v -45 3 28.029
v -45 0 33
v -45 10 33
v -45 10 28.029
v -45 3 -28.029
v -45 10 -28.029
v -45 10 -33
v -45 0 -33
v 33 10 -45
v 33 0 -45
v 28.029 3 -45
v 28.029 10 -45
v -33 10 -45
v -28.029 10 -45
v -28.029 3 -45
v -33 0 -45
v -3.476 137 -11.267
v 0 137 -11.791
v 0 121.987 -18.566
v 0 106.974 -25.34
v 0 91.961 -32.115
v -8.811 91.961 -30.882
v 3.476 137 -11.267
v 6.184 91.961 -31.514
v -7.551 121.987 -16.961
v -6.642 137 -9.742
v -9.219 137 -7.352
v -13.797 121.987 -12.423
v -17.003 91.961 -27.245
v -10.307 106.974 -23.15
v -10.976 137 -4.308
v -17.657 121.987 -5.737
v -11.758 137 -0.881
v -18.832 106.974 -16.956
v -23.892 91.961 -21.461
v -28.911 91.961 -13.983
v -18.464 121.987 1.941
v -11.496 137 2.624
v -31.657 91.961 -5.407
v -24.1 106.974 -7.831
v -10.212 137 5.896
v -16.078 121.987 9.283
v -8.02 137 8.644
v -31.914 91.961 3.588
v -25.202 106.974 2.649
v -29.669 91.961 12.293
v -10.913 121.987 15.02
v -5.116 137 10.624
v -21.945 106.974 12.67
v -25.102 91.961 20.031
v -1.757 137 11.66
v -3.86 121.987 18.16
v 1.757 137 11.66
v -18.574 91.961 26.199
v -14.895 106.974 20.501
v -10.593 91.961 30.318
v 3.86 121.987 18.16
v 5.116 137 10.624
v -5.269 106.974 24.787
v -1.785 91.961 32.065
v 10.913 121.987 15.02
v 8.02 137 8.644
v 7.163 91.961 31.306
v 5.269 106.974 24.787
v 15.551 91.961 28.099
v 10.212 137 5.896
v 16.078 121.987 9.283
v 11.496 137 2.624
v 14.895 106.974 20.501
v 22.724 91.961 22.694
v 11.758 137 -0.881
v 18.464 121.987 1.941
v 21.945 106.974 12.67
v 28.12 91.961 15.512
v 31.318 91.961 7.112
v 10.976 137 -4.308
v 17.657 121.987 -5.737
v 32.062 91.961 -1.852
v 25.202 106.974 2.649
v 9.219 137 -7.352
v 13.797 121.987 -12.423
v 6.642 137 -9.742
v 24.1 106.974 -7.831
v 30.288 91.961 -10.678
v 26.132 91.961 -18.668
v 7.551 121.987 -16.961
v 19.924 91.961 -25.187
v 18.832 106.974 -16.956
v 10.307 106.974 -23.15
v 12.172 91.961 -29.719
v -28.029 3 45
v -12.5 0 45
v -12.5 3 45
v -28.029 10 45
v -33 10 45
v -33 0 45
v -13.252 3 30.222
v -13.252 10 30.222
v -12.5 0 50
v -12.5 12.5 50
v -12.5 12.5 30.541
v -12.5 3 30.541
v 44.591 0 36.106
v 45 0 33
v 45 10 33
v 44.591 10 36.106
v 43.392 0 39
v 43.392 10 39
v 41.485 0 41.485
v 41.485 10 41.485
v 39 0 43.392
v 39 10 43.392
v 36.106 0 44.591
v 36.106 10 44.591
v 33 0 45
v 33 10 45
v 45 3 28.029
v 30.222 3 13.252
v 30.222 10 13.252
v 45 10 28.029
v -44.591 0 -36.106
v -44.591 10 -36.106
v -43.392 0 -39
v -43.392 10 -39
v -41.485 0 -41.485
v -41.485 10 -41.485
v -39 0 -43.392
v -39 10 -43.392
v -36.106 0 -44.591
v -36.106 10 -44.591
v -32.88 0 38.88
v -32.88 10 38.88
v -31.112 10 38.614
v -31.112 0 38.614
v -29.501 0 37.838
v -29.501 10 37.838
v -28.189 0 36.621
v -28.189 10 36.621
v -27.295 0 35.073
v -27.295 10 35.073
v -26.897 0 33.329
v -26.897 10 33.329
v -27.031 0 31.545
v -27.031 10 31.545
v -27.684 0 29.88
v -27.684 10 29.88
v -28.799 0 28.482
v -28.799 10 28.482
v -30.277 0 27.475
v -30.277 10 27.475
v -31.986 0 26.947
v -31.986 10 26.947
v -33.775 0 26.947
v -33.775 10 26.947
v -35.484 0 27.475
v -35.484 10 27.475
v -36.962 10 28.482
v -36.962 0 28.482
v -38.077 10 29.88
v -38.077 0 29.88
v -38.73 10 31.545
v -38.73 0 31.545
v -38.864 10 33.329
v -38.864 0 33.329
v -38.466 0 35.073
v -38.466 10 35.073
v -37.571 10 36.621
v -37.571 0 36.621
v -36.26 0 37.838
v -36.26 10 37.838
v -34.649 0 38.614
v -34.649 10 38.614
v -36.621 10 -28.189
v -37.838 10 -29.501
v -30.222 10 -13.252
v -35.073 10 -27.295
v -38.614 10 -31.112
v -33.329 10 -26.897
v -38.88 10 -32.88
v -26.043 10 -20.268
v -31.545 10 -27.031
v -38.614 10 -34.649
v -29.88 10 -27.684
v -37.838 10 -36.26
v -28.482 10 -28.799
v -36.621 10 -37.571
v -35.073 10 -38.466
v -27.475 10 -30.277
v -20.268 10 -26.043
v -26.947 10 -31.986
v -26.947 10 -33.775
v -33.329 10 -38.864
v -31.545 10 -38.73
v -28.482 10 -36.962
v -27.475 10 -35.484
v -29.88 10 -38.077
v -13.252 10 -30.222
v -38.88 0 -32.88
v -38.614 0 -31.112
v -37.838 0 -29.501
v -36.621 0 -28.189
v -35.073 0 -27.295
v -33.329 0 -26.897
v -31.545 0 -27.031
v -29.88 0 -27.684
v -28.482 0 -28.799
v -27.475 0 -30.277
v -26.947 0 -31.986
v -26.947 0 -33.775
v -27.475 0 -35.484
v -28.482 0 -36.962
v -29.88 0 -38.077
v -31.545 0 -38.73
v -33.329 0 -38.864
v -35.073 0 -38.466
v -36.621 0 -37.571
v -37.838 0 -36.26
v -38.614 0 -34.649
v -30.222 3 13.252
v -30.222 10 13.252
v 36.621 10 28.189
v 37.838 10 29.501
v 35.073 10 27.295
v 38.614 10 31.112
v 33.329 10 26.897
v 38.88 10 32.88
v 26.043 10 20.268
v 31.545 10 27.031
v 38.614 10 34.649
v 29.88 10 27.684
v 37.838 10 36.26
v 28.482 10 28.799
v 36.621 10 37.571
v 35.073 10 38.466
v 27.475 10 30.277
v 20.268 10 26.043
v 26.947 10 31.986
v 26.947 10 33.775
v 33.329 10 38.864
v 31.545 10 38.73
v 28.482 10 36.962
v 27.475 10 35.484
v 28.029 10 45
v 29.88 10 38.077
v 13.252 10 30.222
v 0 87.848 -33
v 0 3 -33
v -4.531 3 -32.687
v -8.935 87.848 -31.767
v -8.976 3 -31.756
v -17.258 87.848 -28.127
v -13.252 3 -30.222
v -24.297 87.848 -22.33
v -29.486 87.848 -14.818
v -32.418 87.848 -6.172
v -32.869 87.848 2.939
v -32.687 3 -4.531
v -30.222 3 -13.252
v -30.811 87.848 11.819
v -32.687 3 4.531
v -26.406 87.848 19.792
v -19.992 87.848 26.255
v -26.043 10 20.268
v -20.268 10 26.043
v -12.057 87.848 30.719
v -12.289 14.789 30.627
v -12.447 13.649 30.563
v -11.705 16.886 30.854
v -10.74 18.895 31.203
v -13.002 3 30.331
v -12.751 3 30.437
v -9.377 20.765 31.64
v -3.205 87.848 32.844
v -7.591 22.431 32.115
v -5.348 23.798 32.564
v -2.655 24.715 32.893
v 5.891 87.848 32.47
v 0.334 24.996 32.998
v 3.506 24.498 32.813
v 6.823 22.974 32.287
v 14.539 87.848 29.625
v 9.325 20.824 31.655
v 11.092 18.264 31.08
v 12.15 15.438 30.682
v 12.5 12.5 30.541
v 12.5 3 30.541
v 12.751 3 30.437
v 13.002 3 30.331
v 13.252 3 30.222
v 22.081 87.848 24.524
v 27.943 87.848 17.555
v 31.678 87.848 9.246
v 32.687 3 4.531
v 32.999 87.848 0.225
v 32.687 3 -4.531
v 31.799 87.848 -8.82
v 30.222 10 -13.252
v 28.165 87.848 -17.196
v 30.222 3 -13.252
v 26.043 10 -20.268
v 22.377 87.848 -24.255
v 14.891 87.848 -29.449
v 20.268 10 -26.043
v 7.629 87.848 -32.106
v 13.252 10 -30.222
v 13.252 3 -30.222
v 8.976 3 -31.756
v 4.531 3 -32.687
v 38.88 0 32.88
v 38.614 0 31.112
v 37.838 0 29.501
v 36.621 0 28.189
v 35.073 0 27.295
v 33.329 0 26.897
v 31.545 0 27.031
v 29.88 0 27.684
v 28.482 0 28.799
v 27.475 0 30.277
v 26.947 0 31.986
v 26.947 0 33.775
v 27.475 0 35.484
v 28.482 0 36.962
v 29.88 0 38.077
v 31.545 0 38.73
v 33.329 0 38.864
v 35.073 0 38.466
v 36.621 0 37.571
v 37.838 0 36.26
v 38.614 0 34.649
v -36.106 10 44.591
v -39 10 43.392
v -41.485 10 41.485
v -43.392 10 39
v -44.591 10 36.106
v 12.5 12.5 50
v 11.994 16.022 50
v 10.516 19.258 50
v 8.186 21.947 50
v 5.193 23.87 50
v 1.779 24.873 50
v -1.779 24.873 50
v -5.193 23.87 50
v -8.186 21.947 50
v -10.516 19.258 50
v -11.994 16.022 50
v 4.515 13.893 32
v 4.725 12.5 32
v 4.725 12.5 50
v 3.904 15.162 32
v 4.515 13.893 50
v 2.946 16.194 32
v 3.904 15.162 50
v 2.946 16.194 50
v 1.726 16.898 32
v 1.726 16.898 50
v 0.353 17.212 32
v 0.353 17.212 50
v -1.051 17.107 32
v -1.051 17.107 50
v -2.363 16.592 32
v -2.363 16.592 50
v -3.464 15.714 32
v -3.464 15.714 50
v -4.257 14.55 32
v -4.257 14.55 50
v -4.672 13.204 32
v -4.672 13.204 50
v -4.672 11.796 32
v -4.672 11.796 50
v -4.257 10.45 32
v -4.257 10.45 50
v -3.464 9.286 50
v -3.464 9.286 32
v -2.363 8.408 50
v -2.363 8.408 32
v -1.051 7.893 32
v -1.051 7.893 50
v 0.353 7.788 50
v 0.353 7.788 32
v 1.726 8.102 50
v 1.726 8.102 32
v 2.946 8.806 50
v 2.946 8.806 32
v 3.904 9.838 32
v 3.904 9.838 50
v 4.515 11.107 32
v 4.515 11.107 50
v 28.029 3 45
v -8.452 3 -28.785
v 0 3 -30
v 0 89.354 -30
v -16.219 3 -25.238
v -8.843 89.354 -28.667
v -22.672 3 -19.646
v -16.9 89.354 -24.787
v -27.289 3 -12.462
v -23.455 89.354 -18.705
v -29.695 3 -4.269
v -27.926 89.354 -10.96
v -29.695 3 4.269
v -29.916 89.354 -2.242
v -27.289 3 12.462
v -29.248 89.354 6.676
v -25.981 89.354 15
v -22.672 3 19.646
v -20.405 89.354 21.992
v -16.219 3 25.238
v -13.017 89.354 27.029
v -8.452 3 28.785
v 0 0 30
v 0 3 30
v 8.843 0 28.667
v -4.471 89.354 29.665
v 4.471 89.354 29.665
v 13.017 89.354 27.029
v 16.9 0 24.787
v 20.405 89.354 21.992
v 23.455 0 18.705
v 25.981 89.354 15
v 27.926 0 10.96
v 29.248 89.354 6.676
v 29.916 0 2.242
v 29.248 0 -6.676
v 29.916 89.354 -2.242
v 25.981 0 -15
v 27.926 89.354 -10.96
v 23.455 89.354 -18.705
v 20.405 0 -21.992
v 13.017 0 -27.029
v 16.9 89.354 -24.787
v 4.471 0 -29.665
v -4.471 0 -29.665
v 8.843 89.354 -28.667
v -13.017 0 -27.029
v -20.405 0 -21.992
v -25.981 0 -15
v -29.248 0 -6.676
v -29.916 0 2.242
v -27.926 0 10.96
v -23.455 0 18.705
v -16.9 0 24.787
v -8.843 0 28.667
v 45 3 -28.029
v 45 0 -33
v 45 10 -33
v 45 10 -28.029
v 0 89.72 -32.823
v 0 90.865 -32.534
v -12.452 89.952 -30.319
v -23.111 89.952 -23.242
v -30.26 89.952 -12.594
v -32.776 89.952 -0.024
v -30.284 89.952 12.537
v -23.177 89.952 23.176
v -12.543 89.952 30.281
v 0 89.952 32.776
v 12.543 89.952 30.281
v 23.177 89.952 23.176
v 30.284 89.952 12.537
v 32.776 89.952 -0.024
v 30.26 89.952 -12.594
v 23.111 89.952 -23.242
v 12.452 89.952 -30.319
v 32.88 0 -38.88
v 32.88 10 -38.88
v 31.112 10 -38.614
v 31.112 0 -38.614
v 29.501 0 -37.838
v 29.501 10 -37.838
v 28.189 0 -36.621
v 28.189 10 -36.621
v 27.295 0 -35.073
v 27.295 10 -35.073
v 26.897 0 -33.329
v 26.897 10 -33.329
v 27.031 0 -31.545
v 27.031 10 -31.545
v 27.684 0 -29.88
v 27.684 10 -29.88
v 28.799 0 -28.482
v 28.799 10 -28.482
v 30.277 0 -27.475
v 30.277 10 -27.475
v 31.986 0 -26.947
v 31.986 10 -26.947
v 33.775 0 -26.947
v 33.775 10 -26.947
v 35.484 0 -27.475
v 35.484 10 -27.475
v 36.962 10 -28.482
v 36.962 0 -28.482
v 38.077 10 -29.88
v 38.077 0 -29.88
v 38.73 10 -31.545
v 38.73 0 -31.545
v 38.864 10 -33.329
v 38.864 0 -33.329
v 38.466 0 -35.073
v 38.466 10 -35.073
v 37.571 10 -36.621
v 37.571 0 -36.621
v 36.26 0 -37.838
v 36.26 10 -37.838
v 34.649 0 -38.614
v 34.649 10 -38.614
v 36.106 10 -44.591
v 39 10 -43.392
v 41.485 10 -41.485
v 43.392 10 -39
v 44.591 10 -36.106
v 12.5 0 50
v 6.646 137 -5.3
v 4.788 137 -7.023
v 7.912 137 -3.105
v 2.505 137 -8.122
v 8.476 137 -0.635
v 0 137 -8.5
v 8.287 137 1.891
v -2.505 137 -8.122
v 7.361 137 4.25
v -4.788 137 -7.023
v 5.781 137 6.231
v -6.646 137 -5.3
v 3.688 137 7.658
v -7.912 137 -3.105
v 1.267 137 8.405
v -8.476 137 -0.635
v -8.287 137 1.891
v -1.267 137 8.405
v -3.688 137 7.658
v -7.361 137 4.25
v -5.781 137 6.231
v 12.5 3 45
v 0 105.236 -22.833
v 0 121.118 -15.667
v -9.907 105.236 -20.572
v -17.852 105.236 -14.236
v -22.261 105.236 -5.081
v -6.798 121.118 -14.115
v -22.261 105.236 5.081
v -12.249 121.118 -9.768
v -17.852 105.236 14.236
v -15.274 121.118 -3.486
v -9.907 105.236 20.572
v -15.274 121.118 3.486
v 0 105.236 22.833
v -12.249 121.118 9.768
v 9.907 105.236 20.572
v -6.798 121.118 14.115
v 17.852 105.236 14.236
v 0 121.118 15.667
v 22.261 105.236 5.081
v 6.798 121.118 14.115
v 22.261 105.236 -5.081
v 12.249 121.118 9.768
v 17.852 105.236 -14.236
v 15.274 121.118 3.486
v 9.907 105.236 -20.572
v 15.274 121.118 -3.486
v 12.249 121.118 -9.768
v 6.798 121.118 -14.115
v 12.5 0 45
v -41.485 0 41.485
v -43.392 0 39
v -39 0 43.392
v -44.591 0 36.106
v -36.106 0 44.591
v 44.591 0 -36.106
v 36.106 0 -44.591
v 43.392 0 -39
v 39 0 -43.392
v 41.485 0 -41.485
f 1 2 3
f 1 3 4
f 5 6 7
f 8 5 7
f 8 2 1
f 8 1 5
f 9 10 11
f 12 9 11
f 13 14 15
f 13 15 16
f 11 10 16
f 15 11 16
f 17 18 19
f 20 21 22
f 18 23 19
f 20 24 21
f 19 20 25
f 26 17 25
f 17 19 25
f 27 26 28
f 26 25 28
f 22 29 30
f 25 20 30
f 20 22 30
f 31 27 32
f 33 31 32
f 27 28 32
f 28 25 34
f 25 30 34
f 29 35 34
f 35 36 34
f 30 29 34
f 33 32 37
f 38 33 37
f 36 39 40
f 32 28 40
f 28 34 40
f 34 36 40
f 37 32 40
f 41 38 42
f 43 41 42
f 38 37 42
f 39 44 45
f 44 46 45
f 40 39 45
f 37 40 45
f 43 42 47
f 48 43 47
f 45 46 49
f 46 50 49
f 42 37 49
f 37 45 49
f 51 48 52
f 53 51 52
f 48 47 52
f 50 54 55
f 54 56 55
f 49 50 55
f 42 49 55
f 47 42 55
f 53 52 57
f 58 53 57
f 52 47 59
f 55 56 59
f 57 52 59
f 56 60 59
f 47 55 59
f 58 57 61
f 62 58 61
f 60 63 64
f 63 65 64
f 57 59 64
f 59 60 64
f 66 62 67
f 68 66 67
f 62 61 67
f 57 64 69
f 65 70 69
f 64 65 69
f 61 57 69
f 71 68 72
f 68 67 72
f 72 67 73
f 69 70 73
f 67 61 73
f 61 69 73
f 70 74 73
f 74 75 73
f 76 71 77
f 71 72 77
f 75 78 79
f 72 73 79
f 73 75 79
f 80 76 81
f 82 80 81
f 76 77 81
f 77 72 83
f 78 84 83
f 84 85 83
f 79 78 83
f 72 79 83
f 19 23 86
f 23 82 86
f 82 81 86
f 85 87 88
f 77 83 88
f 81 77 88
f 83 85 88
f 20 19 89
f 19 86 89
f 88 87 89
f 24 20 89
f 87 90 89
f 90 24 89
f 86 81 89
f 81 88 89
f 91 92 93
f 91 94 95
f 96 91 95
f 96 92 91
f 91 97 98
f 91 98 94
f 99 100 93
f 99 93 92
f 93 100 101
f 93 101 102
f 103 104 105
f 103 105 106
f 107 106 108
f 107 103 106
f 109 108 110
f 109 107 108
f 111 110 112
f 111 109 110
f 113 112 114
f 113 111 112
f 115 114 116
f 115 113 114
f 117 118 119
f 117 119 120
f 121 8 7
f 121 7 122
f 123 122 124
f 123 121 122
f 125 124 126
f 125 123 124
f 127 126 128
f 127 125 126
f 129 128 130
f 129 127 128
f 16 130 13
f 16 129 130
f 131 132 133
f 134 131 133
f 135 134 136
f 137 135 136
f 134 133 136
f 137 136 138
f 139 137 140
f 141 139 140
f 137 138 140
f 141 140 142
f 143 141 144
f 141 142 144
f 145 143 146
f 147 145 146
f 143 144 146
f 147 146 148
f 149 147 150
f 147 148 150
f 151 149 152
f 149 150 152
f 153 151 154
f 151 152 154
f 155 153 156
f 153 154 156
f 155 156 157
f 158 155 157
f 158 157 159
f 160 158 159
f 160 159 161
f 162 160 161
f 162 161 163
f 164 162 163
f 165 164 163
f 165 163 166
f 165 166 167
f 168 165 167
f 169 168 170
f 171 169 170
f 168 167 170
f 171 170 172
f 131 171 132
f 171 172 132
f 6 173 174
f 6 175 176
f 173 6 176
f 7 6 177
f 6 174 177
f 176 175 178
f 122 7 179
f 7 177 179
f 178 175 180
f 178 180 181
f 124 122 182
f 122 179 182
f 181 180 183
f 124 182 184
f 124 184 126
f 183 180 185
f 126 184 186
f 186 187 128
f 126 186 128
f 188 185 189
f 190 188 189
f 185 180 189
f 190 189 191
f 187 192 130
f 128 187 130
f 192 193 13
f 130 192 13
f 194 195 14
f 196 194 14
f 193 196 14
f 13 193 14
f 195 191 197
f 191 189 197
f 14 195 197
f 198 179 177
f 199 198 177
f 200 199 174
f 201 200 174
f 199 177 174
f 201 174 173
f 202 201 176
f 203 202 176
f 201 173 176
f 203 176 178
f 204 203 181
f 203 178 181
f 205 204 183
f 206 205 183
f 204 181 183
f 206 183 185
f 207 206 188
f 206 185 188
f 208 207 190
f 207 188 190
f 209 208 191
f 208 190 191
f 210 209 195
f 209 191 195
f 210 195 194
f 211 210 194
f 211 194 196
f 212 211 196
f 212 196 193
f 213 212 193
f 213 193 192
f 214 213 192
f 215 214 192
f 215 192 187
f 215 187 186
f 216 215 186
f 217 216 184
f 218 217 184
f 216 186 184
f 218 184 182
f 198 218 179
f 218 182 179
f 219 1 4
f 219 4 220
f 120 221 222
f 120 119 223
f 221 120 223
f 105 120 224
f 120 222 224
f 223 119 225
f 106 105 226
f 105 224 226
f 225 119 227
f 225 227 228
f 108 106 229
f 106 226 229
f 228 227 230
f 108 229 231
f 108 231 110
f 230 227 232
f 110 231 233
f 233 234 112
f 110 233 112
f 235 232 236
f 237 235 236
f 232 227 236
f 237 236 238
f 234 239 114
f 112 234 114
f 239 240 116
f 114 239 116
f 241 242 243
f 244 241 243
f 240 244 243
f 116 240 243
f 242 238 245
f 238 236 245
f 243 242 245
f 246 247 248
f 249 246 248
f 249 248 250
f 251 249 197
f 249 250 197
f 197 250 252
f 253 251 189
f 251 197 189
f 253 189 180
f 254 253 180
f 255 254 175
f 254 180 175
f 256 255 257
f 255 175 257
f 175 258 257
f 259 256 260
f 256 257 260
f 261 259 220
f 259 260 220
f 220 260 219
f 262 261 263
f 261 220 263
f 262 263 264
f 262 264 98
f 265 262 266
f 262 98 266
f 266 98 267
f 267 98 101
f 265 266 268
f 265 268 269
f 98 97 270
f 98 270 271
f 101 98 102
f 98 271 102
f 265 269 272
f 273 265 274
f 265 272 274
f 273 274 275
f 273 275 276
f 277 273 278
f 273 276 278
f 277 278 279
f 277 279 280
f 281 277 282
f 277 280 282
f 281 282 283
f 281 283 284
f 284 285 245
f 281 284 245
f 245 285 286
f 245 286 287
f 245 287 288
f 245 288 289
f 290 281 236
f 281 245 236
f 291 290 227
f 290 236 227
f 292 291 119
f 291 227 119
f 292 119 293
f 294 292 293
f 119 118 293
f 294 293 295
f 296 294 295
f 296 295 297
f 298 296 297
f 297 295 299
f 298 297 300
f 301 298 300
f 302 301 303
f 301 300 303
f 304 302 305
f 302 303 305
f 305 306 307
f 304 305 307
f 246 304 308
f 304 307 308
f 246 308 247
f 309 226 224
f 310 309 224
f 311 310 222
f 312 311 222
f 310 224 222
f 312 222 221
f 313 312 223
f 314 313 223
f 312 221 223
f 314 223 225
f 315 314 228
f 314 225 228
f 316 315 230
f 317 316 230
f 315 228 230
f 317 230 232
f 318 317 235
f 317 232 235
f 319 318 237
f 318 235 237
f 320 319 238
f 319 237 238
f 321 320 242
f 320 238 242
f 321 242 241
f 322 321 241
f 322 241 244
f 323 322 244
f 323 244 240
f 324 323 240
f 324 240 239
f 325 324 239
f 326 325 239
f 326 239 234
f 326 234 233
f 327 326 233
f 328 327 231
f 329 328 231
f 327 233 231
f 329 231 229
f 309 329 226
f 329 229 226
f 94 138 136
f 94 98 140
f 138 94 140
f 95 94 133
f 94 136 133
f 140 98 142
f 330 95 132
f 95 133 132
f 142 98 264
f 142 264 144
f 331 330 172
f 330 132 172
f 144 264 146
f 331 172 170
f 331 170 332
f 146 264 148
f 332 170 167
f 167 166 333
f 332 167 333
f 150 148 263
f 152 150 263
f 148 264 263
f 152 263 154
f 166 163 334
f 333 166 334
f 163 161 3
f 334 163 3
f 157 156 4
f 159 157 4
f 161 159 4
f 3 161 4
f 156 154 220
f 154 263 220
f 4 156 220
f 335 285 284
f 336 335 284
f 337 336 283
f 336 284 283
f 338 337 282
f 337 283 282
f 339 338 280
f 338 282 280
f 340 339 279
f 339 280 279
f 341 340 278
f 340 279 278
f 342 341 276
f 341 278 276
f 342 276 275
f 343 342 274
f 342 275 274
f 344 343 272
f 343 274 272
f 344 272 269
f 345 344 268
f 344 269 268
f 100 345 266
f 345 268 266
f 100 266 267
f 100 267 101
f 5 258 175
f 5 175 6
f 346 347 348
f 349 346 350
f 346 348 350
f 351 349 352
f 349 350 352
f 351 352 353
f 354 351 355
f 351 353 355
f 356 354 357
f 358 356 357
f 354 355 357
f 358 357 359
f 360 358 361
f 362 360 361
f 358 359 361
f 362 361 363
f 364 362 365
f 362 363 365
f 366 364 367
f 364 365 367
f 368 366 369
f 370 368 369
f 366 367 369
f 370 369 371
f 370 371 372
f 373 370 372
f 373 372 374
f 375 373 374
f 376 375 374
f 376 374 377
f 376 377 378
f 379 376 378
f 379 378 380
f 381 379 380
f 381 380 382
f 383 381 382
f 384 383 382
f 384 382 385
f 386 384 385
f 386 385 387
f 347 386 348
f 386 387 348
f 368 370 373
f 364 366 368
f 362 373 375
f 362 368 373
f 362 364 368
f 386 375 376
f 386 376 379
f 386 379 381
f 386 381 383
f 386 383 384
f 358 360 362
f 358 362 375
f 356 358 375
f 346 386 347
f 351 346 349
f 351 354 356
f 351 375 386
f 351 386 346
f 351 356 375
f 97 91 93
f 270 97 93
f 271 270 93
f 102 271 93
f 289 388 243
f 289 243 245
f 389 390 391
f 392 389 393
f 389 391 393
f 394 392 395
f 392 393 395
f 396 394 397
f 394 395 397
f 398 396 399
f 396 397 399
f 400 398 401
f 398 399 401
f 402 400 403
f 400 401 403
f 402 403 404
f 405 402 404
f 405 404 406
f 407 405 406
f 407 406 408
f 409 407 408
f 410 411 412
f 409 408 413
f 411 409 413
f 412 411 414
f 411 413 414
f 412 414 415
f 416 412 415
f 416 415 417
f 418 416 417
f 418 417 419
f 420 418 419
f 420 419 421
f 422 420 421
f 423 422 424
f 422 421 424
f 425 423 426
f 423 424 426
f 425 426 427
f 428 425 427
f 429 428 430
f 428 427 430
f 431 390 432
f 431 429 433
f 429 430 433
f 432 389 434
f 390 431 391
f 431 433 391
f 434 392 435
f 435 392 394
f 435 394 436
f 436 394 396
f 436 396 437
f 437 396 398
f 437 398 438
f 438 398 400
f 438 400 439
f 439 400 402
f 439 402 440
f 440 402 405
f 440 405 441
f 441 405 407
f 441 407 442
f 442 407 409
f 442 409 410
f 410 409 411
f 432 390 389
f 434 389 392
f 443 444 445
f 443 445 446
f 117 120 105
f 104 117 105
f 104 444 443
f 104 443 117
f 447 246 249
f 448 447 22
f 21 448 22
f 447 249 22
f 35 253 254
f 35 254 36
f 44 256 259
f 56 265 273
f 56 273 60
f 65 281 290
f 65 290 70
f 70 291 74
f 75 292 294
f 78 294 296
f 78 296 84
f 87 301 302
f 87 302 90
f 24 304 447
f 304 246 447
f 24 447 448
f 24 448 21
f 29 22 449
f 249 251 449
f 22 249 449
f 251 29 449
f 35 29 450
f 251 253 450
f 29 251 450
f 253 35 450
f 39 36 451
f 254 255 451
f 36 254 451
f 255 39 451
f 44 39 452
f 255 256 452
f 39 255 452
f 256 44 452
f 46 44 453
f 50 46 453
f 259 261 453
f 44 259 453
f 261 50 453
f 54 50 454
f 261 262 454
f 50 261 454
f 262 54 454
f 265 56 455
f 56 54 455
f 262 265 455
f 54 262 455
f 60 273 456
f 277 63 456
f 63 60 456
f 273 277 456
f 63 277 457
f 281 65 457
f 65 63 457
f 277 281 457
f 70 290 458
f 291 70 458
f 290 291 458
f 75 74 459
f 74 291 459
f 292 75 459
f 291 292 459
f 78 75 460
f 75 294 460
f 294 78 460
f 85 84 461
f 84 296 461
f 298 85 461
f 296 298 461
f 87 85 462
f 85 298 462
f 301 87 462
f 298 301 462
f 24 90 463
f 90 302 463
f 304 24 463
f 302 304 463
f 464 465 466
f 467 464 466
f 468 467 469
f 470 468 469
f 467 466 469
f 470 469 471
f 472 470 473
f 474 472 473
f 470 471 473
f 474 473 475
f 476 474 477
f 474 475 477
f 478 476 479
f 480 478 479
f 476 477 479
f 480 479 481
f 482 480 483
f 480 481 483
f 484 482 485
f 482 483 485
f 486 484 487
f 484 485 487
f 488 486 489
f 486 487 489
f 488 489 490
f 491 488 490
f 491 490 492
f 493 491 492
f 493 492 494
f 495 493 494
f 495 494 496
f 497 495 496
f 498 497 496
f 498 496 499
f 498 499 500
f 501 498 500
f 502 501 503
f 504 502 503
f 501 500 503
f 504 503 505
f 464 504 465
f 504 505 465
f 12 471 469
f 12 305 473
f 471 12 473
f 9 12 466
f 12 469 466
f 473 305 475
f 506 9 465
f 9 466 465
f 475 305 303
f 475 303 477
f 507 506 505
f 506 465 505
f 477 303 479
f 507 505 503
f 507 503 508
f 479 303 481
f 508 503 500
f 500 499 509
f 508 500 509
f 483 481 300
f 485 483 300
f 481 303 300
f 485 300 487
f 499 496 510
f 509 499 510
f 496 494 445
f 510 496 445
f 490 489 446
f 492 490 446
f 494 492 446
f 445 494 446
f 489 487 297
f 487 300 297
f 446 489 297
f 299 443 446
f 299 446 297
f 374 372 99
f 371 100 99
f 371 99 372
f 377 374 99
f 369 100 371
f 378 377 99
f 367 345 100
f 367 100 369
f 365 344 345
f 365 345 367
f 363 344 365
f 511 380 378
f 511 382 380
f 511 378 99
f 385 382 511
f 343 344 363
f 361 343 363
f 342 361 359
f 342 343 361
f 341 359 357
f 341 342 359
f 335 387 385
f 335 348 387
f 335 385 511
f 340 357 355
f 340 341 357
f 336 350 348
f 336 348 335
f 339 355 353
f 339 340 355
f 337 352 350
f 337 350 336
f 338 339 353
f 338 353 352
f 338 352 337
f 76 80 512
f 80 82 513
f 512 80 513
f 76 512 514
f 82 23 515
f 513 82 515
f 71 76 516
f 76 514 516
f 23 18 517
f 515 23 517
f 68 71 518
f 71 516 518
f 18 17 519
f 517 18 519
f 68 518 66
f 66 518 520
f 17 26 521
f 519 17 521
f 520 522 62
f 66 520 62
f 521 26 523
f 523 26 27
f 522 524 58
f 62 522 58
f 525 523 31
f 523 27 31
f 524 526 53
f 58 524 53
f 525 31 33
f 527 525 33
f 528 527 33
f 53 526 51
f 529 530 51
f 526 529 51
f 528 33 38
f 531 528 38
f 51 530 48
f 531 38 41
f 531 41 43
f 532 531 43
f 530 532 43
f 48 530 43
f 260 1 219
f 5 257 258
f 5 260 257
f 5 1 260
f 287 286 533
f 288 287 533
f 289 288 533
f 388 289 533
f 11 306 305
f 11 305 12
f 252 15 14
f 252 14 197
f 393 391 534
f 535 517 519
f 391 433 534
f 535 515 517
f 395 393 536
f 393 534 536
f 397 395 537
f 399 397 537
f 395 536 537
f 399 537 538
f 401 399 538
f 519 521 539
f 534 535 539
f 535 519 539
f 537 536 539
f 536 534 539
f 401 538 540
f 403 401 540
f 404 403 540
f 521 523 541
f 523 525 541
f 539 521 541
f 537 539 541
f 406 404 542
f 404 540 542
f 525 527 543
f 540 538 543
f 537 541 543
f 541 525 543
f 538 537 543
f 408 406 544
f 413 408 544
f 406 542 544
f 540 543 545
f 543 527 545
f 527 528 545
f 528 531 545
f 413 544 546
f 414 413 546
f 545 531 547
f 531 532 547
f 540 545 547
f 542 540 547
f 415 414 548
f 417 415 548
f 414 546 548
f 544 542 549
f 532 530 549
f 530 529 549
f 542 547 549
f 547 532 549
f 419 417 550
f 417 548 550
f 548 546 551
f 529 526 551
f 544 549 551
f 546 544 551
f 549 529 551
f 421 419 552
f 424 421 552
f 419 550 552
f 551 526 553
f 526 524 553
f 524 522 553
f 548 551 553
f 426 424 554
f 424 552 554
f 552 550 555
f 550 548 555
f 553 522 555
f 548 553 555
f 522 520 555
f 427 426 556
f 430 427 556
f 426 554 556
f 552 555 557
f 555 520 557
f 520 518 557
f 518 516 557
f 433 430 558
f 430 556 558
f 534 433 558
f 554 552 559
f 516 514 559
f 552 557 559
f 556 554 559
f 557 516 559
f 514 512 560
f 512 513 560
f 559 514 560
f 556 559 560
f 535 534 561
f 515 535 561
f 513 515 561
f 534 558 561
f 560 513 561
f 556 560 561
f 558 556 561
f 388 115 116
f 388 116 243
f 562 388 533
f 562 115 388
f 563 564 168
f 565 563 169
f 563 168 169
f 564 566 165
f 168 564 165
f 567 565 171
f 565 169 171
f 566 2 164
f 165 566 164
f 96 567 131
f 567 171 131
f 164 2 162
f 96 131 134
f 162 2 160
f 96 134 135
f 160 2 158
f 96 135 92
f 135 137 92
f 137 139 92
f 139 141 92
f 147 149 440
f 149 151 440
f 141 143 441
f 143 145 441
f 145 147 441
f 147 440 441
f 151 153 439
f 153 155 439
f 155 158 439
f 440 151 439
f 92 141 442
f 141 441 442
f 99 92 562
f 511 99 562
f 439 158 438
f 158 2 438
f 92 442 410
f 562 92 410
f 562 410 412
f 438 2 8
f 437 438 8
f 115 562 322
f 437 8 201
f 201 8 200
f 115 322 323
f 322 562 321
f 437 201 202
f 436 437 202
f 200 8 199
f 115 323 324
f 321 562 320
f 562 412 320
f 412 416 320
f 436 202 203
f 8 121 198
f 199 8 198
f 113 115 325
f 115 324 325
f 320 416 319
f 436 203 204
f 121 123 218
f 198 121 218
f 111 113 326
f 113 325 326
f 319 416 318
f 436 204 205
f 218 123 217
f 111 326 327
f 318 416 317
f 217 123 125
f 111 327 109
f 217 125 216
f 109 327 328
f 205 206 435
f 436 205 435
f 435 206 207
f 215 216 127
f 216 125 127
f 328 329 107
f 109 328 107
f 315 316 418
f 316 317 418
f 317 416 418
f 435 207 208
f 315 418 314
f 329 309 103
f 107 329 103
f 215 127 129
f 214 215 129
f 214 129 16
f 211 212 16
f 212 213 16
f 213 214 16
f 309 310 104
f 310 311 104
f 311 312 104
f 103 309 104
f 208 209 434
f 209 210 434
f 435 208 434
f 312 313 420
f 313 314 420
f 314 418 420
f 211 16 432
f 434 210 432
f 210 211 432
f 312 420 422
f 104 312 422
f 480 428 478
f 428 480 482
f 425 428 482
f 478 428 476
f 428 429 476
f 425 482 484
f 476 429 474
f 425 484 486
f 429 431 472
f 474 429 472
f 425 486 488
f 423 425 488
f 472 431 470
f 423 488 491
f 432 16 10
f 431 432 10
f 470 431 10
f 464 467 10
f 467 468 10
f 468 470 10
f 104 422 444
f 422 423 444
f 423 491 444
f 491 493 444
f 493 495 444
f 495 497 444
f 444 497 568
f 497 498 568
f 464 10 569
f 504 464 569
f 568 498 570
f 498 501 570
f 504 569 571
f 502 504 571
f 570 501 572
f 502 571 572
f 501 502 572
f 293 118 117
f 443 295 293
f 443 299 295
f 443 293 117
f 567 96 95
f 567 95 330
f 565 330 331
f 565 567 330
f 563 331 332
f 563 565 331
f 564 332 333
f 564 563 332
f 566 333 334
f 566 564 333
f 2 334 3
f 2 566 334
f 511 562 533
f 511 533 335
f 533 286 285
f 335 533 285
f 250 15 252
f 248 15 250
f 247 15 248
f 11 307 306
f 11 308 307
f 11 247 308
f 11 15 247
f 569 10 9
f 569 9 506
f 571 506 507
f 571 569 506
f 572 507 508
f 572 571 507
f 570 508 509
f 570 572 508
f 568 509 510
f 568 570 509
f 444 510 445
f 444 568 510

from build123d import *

# Parameters (mm, degrees)
BOSS_EXTRUDE1_DEPTH = 3
SKETCH2_R           = 30
CUT_EXTRUDE1_DEPTH  = 3
BOSS_EXTRUDE2_DEPTH = 7
SKETCH5_R           = 6
CUT_EXTRUDE2_DEPTH  = 10
CIRPATTERN1_COUNT   = 4
BOSS_EXTRUDE3_START = -14.459044
BOSS_EXTRUDE3_DEPTH = 19.459044
SKETCH8_R           = 4.725
CUT_EXTRUDE3_DEPTH  = 18
FILLET1_R           = 10


with BuildPart() as part:
    # Sketch1 → Boss-Extrude1 (new body)
    with BuildSketch(Plane(origin=(0, 0, 0), x_dir=(1, 0, 0), z_dir=(0, 1, 0))):
        with BuildLine():
            Line((-33, -45), (33, -45))
            ThreePointArc((33, -45), (41.485281374, -41.485281374), (45, -33))
            Line((45, -33), (45, 33))
            ThreePointArc((45, 33), (41.485281374, 41.485281374), (33, 45))
            Line((33, 45), (-33, 45))
            ThreePointArc((-33, 45), (-41.485281374, 41.485281374), (-45, 33))
            Line((-45, 33), (-45, -33))
            ThreePointArc((-45, -33), (-41.485281374, -41.485281374), (-33, -45))
        make_face()
    extrude(amount=BOSS_EXTRUDE1_DEPTH)

    # Sketch2 → Cut-Extrude1 (cut)
    with BuildSketch(Plane(origin=(0, 3, 0), x_dir=(1, 0, 0), z_dir=(0, 1, 0))):
        with Locations(Location((0, 0, 0), (0, 0, 270))):
            Circle(SKETCH2_R)
    extrude(amount=-CUT_EXTRUDE1_DEPTH, mode=Mode.SUBTRACT)

    # Sketch3 → Revolve1 (revolve)
    with BuildSketch(Plane.XY, mode=Mode.PRIVATE) as revolve1_sk:
        Polygon((30, 3), (30, 89.354466715), (8.5, 137), (11.79129626, 137), (33, 90), (33, 3), align=None)
    revolve(revolve1_sk.sketch.rotate(Axis((0, -84.852813742, 0), (0, 1, 0)), 90), axis=Axis((0, -84.852813742, 0), (0, 1, 0)))

    # Sketch4 → Boss-Extrude2 (add)
    with BuildSketch(Plane(origin=(0, 3, 0), x_dir=(1, 0, 0), z_dir=(0, 1, 0))):
        with BuildLine():
            Line((-13.251783745, -30.222346494), (-28.029437252, -45))
            Line((-28.029437252, -45), (-33, -45))
            ThreePointArc((-33, -45), (-41.485281374, -41.485281374), (-45, -33))
            Line((-45, -33), (-45, -28.029437252))
            Line((-45, -28.029437252), (-30.222346494, -13.251783745))
            ThreePointArc((-30.222346494, -13.251783745), (-23.334523779, -23.334523779), (-13.251783745, -30.222346494))
        make_face()
    boss_extrude2 = extrude(amount=BOSS_EXTRUDE2_DEPTH)

    # Sketch5 → Cut-Extrude2 (cut)
    with BuildSketch(Plane(origin=(0, 10, 0), x_dir=(1, 0, 0), z_dir=(0, 1, 0))):
        with Locations(Location((-32.880465325, -32.880465325, 0), (0, 0, 270))):
            Circle(SKETCH5_R)
    cut_extrude2 = extrude(amount=-CUT_EXTRUDE2_DEPTH, mode=Mode.SUBTRACT)

    # CirPattern1: Boss-Extrude2, Cut-Extrude2 ×4 about axis
    cirpattern1_axis = Axis((0, 0, 0), (0, 1, 0))
    add([boss_extrude2.rotate(cirpattern1_axis, i * 360 / CIRPATTERN1_COUNT) for i in range(1, CIRPATTERN1_COUNT)])
    add([cut_extrude2.rotate(cirpattern1_axis, i * 360 / CIRPATTERN1_COUNT) for i in range(1, CIRPATTERN1_COUNT)], mode=Mode.SUBTRACT)

    # Sketch6 → Boss-Extrude3 (add)
    with BuildSketch(Plane.XY.offset(45).offset(BOSS_EXTRUDE3_START)):
        with BuildLine():
            Line((-12.5, 12.5), (-12.5, 0))
            Line((-12.5, 0), (12.5, 0))
            Line((12.5, 0), (12.5, 12.5))
            ThreePointArc((12.5, 12.5), (0, 25), (-12.5, 12.5))
        make_face()
    extrude(amount=BOSS_EXTRUDE3_DEPTH)

    # Sketch8 → Cut-Extrude3 (cut)
    with BuildSketch(Plane.XY.offset(50)):
        with Locations((0, 12.5)):
            Circle(SKETCH8_R)
    extrude(amount=-CUT_EXTRUDE3_DEPTH, mode=Mode.SUBTRACT)

    # Fillet1
    fillet1_edges = [part.edges().sort_by_distance(p)[0] for p in [
        (0, 90, 33),
    ]]
    fillet(fillet1_edges, radius=FILLET1_R)


solid = part.part
